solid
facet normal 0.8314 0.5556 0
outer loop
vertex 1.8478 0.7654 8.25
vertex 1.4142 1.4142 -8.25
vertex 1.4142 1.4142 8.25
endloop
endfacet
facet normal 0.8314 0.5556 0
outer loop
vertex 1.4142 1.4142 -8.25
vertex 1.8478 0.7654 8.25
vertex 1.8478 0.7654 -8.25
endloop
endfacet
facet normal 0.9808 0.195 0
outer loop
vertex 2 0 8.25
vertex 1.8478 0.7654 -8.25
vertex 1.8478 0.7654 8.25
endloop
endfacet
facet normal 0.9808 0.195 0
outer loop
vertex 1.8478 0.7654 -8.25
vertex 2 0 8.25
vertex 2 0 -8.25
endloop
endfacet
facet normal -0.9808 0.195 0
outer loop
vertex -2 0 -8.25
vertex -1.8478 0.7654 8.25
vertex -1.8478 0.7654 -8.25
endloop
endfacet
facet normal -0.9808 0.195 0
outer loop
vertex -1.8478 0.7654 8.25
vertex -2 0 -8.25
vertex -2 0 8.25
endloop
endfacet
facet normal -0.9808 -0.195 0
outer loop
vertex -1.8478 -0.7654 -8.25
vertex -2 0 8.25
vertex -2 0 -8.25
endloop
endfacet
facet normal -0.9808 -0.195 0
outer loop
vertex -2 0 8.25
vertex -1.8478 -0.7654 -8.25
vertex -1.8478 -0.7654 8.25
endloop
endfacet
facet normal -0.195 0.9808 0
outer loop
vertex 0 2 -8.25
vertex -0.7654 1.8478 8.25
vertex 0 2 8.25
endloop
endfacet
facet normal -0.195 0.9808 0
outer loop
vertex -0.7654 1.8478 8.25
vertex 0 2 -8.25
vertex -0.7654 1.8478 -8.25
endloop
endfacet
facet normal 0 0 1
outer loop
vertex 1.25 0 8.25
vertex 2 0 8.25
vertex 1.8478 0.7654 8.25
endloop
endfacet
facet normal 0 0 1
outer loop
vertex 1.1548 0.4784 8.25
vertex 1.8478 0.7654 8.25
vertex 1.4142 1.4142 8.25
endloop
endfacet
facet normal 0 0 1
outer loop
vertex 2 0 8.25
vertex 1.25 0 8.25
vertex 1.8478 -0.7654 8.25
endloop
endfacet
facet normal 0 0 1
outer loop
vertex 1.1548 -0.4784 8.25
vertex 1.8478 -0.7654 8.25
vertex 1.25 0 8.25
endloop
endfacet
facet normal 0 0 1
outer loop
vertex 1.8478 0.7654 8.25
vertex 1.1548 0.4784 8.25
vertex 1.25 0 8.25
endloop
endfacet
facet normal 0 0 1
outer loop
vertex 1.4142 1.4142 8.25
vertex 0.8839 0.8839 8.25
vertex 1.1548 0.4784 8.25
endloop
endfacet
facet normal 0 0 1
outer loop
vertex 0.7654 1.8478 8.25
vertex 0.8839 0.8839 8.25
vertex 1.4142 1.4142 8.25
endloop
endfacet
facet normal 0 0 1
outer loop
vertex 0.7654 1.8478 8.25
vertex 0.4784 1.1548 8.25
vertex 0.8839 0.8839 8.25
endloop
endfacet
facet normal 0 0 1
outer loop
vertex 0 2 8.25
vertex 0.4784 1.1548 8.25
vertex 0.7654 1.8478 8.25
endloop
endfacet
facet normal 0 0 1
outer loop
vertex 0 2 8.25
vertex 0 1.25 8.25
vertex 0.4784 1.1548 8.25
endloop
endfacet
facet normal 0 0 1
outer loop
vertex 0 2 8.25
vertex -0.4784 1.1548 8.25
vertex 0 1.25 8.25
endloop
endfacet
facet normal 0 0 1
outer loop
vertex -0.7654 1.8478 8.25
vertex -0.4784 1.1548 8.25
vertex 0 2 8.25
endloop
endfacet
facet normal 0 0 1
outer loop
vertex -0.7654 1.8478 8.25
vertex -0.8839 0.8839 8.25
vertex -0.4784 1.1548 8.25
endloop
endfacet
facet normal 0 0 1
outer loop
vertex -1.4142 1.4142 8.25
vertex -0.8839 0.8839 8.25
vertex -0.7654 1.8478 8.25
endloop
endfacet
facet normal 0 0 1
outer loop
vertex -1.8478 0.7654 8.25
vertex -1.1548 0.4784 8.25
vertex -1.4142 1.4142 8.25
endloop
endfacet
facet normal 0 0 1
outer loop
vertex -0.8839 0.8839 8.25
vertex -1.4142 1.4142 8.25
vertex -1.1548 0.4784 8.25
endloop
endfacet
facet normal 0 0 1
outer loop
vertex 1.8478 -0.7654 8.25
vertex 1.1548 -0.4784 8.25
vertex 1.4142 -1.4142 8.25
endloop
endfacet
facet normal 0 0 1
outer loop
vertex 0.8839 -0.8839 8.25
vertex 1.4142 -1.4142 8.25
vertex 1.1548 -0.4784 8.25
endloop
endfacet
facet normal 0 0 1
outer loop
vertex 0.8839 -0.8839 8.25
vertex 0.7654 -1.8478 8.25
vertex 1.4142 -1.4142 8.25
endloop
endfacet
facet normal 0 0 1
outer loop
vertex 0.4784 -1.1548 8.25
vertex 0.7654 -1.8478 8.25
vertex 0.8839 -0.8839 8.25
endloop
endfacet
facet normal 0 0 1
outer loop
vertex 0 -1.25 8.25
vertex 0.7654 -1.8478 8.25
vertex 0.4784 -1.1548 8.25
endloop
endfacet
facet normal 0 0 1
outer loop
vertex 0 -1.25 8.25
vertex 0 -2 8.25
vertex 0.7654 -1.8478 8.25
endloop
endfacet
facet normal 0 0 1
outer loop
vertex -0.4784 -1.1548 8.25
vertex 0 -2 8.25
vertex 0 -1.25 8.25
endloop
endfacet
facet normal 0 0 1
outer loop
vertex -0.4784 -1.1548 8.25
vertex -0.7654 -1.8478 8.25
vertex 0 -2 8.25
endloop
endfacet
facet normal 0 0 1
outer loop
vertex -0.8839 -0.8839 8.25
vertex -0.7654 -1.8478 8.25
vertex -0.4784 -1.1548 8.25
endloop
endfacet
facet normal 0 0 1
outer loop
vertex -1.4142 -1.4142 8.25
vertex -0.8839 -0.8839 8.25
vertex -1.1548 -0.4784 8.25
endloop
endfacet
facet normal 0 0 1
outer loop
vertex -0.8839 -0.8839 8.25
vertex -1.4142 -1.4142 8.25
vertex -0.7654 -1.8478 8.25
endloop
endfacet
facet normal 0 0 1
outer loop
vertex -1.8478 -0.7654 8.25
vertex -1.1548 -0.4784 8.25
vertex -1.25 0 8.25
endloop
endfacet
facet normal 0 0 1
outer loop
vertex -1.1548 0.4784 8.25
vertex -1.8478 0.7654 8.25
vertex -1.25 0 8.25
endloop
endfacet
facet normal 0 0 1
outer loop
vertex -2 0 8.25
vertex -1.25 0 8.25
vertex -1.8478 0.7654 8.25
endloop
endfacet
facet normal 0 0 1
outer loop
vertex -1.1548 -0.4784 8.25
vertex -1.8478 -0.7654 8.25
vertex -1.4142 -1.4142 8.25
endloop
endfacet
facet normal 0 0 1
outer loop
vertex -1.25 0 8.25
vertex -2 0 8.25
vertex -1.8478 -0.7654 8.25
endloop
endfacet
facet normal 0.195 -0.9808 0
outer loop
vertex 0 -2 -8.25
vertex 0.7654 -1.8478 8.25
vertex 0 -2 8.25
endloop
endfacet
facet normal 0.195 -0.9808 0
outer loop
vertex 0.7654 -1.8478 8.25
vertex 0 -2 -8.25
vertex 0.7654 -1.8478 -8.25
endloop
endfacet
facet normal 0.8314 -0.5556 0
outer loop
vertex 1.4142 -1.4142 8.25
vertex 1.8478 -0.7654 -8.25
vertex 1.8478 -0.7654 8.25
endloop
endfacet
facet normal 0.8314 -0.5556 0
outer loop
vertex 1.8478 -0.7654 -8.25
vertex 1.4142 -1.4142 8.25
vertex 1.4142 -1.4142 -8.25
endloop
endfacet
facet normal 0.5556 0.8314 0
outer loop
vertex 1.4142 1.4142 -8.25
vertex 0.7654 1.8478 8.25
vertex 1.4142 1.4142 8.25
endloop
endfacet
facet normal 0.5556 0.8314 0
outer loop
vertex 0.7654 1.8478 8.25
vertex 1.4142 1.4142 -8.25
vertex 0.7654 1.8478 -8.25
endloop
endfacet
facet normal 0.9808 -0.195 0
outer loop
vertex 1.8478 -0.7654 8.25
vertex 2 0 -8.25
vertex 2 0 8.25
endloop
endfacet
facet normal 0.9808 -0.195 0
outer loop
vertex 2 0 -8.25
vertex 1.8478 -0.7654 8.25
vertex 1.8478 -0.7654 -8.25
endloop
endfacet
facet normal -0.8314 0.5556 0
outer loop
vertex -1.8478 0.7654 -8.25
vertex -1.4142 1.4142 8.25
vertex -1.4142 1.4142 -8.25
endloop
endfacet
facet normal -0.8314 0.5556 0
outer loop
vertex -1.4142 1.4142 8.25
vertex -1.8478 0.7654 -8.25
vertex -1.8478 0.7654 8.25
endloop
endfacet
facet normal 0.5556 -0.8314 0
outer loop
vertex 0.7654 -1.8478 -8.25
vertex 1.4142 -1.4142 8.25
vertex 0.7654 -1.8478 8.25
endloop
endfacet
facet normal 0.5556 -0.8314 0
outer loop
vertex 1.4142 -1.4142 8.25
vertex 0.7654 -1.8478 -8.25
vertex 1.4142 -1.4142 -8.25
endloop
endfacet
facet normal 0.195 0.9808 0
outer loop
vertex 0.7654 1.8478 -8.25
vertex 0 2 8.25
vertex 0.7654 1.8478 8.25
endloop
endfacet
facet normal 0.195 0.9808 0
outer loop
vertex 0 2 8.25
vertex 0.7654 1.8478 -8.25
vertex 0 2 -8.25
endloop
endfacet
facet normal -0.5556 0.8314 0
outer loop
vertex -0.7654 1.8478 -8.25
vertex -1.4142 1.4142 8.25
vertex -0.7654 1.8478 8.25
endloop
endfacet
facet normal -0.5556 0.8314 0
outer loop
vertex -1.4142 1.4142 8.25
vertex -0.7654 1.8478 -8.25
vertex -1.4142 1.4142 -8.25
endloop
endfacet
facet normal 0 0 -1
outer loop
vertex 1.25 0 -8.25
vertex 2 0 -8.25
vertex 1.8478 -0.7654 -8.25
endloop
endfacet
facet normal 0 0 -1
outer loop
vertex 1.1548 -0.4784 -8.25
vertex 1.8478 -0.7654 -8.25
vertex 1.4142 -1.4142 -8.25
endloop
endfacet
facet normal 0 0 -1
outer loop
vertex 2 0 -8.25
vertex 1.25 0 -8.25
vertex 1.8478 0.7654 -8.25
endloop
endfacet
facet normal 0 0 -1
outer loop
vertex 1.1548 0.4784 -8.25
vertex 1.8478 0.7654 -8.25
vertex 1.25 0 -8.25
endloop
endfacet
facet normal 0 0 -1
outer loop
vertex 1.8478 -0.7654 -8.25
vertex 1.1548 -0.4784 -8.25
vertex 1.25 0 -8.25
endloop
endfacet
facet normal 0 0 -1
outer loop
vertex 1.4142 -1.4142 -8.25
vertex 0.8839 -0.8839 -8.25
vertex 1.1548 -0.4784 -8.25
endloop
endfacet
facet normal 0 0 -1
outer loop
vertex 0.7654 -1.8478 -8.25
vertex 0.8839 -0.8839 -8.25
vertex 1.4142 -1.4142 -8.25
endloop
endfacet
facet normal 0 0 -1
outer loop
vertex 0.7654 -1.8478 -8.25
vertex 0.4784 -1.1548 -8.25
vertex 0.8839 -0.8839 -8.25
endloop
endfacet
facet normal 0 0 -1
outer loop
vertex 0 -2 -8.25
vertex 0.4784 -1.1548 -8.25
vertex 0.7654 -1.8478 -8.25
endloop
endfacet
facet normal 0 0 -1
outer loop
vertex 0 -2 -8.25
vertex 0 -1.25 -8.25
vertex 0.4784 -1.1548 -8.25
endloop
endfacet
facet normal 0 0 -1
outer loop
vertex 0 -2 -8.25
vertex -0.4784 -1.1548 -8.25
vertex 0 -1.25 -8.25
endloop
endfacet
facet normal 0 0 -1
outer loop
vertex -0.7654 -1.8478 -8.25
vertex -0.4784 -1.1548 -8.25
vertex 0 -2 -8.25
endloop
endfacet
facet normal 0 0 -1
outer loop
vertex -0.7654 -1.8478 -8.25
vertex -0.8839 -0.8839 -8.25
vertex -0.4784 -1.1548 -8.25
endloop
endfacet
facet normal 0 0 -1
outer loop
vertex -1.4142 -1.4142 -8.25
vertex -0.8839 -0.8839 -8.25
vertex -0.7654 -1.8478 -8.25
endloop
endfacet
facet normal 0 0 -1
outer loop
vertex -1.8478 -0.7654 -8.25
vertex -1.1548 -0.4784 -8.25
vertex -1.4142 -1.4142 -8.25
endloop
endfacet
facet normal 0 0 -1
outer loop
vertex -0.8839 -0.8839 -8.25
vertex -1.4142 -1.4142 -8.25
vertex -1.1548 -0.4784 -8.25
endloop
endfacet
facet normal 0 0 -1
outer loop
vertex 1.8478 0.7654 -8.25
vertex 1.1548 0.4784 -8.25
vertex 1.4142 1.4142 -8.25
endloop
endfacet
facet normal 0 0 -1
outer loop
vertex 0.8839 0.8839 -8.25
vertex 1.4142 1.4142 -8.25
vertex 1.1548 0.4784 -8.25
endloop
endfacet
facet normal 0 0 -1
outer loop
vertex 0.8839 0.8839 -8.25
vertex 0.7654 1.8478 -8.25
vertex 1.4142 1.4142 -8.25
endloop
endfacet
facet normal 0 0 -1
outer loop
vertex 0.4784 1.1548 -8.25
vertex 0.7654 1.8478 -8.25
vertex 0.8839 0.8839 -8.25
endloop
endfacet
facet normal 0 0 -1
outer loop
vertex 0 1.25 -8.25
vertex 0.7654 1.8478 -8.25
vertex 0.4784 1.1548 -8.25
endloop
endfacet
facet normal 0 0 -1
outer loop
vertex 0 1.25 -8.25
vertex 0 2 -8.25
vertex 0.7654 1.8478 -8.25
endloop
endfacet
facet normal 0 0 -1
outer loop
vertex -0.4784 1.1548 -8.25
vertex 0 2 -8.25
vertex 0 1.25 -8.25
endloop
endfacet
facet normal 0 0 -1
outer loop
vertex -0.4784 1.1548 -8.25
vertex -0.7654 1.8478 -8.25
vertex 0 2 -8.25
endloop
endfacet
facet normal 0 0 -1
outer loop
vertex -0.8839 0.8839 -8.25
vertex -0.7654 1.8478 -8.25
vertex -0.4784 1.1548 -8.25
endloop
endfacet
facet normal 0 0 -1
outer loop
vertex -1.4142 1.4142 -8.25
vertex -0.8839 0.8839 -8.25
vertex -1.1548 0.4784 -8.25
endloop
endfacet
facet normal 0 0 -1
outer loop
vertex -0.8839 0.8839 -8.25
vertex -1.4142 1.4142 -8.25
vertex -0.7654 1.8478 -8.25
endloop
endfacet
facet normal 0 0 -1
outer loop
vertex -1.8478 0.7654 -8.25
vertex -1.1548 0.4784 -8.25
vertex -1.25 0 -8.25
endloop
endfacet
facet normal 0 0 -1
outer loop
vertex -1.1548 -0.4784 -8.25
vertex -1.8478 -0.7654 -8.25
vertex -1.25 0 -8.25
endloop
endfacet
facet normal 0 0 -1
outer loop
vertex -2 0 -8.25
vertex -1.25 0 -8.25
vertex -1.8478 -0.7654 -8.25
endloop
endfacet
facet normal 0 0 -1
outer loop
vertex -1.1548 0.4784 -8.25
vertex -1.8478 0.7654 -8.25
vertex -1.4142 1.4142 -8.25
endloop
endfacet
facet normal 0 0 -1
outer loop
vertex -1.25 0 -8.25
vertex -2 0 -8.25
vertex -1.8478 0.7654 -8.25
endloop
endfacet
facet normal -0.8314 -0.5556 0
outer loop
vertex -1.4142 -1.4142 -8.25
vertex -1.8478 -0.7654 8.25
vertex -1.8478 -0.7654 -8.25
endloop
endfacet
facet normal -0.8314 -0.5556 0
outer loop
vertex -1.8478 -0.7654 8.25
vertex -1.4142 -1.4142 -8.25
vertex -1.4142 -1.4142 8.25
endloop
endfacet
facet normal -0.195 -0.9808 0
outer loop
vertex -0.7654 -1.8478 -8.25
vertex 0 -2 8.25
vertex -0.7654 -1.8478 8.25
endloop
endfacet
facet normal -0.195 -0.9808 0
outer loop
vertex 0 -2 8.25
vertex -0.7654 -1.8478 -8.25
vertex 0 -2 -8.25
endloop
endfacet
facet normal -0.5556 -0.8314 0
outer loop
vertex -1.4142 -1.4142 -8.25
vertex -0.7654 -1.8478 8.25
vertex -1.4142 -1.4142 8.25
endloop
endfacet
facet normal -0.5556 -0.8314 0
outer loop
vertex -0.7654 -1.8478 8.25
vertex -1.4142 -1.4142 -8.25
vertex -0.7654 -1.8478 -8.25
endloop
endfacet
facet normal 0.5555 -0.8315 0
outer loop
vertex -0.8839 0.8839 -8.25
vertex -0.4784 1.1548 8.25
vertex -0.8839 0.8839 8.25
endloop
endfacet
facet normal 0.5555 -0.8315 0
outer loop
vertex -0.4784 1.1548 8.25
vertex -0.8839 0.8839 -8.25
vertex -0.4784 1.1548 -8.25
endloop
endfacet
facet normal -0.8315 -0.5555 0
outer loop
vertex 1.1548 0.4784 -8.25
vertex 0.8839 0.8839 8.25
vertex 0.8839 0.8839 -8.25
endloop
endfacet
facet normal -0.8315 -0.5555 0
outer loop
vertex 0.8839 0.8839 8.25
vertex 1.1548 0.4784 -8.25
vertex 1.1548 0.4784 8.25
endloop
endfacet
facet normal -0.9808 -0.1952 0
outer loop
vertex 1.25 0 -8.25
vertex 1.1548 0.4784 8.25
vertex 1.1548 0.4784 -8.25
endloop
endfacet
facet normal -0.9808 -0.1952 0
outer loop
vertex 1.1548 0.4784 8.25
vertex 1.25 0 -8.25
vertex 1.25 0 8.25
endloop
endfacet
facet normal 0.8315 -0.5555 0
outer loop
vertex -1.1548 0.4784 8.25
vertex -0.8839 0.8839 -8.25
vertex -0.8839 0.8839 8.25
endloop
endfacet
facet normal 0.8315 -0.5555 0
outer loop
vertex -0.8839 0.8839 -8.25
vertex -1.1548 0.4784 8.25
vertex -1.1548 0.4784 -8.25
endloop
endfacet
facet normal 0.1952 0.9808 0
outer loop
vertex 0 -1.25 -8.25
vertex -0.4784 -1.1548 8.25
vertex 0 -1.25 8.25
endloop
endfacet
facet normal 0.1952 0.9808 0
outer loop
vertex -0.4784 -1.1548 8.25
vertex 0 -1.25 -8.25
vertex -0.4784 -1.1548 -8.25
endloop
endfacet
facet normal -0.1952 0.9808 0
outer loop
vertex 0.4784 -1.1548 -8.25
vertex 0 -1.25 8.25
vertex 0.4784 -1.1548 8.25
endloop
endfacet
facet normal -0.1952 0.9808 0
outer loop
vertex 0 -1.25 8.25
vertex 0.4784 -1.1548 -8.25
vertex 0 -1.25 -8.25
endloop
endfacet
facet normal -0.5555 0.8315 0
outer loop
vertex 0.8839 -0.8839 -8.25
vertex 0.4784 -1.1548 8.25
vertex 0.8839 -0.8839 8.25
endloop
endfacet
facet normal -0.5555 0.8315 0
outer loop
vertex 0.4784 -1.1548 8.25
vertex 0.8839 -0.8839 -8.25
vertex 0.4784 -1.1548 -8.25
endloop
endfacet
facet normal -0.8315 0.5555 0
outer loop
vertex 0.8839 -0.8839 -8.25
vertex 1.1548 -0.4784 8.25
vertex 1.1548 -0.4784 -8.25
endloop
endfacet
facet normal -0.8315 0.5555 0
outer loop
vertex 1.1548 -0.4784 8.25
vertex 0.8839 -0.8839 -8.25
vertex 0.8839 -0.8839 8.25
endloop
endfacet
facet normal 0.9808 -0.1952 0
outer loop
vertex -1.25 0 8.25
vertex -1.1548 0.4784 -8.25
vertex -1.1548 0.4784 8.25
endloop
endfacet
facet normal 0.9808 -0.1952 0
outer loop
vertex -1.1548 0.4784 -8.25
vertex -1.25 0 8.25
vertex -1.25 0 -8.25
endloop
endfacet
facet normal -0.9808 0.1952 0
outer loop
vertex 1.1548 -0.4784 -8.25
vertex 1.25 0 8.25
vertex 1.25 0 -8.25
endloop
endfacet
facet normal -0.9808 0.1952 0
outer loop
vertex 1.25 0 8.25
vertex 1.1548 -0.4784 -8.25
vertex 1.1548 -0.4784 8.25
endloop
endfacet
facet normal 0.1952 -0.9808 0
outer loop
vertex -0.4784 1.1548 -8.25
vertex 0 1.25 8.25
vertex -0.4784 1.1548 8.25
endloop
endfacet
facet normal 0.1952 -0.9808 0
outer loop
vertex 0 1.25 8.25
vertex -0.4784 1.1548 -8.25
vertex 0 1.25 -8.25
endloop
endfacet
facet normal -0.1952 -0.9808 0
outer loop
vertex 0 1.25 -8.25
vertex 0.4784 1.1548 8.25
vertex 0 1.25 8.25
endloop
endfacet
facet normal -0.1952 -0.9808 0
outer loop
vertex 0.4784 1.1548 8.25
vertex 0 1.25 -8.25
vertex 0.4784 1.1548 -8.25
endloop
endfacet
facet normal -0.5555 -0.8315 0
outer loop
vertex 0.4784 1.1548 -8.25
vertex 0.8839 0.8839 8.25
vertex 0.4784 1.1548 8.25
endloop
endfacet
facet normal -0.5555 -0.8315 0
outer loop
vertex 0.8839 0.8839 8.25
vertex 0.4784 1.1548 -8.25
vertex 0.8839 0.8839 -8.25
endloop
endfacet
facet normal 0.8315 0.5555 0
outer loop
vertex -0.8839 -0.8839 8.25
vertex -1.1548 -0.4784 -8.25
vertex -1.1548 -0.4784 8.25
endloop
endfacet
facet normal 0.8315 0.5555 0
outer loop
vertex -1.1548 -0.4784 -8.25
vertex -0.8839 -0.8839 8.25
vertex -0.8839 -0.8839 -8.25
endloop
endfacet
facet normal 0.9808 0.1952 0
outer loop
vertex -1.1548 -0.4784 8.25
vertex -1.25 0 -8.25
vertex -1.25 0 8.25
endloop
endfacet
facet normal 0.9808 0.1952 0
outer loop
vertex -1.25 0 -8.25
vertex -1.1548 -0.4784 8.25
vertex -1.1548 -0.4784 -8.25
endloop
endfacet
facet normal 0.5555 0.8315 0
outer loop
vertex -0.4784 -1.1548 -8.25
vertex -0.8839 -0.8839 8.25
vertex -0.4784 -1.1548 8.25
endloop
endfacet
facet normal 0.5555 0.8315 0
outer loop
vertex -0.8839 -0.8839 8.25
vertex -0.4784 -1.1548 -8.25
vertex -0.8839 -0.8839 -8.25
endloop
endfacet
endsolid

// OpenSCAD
// COBRA Tendon Guide - 16.5mm

$fn = 16;

difference() {
    cylinder(h=16.5, d=4, center=true);
    cylinder(h=18.5, d=2.5, center=true);
}
